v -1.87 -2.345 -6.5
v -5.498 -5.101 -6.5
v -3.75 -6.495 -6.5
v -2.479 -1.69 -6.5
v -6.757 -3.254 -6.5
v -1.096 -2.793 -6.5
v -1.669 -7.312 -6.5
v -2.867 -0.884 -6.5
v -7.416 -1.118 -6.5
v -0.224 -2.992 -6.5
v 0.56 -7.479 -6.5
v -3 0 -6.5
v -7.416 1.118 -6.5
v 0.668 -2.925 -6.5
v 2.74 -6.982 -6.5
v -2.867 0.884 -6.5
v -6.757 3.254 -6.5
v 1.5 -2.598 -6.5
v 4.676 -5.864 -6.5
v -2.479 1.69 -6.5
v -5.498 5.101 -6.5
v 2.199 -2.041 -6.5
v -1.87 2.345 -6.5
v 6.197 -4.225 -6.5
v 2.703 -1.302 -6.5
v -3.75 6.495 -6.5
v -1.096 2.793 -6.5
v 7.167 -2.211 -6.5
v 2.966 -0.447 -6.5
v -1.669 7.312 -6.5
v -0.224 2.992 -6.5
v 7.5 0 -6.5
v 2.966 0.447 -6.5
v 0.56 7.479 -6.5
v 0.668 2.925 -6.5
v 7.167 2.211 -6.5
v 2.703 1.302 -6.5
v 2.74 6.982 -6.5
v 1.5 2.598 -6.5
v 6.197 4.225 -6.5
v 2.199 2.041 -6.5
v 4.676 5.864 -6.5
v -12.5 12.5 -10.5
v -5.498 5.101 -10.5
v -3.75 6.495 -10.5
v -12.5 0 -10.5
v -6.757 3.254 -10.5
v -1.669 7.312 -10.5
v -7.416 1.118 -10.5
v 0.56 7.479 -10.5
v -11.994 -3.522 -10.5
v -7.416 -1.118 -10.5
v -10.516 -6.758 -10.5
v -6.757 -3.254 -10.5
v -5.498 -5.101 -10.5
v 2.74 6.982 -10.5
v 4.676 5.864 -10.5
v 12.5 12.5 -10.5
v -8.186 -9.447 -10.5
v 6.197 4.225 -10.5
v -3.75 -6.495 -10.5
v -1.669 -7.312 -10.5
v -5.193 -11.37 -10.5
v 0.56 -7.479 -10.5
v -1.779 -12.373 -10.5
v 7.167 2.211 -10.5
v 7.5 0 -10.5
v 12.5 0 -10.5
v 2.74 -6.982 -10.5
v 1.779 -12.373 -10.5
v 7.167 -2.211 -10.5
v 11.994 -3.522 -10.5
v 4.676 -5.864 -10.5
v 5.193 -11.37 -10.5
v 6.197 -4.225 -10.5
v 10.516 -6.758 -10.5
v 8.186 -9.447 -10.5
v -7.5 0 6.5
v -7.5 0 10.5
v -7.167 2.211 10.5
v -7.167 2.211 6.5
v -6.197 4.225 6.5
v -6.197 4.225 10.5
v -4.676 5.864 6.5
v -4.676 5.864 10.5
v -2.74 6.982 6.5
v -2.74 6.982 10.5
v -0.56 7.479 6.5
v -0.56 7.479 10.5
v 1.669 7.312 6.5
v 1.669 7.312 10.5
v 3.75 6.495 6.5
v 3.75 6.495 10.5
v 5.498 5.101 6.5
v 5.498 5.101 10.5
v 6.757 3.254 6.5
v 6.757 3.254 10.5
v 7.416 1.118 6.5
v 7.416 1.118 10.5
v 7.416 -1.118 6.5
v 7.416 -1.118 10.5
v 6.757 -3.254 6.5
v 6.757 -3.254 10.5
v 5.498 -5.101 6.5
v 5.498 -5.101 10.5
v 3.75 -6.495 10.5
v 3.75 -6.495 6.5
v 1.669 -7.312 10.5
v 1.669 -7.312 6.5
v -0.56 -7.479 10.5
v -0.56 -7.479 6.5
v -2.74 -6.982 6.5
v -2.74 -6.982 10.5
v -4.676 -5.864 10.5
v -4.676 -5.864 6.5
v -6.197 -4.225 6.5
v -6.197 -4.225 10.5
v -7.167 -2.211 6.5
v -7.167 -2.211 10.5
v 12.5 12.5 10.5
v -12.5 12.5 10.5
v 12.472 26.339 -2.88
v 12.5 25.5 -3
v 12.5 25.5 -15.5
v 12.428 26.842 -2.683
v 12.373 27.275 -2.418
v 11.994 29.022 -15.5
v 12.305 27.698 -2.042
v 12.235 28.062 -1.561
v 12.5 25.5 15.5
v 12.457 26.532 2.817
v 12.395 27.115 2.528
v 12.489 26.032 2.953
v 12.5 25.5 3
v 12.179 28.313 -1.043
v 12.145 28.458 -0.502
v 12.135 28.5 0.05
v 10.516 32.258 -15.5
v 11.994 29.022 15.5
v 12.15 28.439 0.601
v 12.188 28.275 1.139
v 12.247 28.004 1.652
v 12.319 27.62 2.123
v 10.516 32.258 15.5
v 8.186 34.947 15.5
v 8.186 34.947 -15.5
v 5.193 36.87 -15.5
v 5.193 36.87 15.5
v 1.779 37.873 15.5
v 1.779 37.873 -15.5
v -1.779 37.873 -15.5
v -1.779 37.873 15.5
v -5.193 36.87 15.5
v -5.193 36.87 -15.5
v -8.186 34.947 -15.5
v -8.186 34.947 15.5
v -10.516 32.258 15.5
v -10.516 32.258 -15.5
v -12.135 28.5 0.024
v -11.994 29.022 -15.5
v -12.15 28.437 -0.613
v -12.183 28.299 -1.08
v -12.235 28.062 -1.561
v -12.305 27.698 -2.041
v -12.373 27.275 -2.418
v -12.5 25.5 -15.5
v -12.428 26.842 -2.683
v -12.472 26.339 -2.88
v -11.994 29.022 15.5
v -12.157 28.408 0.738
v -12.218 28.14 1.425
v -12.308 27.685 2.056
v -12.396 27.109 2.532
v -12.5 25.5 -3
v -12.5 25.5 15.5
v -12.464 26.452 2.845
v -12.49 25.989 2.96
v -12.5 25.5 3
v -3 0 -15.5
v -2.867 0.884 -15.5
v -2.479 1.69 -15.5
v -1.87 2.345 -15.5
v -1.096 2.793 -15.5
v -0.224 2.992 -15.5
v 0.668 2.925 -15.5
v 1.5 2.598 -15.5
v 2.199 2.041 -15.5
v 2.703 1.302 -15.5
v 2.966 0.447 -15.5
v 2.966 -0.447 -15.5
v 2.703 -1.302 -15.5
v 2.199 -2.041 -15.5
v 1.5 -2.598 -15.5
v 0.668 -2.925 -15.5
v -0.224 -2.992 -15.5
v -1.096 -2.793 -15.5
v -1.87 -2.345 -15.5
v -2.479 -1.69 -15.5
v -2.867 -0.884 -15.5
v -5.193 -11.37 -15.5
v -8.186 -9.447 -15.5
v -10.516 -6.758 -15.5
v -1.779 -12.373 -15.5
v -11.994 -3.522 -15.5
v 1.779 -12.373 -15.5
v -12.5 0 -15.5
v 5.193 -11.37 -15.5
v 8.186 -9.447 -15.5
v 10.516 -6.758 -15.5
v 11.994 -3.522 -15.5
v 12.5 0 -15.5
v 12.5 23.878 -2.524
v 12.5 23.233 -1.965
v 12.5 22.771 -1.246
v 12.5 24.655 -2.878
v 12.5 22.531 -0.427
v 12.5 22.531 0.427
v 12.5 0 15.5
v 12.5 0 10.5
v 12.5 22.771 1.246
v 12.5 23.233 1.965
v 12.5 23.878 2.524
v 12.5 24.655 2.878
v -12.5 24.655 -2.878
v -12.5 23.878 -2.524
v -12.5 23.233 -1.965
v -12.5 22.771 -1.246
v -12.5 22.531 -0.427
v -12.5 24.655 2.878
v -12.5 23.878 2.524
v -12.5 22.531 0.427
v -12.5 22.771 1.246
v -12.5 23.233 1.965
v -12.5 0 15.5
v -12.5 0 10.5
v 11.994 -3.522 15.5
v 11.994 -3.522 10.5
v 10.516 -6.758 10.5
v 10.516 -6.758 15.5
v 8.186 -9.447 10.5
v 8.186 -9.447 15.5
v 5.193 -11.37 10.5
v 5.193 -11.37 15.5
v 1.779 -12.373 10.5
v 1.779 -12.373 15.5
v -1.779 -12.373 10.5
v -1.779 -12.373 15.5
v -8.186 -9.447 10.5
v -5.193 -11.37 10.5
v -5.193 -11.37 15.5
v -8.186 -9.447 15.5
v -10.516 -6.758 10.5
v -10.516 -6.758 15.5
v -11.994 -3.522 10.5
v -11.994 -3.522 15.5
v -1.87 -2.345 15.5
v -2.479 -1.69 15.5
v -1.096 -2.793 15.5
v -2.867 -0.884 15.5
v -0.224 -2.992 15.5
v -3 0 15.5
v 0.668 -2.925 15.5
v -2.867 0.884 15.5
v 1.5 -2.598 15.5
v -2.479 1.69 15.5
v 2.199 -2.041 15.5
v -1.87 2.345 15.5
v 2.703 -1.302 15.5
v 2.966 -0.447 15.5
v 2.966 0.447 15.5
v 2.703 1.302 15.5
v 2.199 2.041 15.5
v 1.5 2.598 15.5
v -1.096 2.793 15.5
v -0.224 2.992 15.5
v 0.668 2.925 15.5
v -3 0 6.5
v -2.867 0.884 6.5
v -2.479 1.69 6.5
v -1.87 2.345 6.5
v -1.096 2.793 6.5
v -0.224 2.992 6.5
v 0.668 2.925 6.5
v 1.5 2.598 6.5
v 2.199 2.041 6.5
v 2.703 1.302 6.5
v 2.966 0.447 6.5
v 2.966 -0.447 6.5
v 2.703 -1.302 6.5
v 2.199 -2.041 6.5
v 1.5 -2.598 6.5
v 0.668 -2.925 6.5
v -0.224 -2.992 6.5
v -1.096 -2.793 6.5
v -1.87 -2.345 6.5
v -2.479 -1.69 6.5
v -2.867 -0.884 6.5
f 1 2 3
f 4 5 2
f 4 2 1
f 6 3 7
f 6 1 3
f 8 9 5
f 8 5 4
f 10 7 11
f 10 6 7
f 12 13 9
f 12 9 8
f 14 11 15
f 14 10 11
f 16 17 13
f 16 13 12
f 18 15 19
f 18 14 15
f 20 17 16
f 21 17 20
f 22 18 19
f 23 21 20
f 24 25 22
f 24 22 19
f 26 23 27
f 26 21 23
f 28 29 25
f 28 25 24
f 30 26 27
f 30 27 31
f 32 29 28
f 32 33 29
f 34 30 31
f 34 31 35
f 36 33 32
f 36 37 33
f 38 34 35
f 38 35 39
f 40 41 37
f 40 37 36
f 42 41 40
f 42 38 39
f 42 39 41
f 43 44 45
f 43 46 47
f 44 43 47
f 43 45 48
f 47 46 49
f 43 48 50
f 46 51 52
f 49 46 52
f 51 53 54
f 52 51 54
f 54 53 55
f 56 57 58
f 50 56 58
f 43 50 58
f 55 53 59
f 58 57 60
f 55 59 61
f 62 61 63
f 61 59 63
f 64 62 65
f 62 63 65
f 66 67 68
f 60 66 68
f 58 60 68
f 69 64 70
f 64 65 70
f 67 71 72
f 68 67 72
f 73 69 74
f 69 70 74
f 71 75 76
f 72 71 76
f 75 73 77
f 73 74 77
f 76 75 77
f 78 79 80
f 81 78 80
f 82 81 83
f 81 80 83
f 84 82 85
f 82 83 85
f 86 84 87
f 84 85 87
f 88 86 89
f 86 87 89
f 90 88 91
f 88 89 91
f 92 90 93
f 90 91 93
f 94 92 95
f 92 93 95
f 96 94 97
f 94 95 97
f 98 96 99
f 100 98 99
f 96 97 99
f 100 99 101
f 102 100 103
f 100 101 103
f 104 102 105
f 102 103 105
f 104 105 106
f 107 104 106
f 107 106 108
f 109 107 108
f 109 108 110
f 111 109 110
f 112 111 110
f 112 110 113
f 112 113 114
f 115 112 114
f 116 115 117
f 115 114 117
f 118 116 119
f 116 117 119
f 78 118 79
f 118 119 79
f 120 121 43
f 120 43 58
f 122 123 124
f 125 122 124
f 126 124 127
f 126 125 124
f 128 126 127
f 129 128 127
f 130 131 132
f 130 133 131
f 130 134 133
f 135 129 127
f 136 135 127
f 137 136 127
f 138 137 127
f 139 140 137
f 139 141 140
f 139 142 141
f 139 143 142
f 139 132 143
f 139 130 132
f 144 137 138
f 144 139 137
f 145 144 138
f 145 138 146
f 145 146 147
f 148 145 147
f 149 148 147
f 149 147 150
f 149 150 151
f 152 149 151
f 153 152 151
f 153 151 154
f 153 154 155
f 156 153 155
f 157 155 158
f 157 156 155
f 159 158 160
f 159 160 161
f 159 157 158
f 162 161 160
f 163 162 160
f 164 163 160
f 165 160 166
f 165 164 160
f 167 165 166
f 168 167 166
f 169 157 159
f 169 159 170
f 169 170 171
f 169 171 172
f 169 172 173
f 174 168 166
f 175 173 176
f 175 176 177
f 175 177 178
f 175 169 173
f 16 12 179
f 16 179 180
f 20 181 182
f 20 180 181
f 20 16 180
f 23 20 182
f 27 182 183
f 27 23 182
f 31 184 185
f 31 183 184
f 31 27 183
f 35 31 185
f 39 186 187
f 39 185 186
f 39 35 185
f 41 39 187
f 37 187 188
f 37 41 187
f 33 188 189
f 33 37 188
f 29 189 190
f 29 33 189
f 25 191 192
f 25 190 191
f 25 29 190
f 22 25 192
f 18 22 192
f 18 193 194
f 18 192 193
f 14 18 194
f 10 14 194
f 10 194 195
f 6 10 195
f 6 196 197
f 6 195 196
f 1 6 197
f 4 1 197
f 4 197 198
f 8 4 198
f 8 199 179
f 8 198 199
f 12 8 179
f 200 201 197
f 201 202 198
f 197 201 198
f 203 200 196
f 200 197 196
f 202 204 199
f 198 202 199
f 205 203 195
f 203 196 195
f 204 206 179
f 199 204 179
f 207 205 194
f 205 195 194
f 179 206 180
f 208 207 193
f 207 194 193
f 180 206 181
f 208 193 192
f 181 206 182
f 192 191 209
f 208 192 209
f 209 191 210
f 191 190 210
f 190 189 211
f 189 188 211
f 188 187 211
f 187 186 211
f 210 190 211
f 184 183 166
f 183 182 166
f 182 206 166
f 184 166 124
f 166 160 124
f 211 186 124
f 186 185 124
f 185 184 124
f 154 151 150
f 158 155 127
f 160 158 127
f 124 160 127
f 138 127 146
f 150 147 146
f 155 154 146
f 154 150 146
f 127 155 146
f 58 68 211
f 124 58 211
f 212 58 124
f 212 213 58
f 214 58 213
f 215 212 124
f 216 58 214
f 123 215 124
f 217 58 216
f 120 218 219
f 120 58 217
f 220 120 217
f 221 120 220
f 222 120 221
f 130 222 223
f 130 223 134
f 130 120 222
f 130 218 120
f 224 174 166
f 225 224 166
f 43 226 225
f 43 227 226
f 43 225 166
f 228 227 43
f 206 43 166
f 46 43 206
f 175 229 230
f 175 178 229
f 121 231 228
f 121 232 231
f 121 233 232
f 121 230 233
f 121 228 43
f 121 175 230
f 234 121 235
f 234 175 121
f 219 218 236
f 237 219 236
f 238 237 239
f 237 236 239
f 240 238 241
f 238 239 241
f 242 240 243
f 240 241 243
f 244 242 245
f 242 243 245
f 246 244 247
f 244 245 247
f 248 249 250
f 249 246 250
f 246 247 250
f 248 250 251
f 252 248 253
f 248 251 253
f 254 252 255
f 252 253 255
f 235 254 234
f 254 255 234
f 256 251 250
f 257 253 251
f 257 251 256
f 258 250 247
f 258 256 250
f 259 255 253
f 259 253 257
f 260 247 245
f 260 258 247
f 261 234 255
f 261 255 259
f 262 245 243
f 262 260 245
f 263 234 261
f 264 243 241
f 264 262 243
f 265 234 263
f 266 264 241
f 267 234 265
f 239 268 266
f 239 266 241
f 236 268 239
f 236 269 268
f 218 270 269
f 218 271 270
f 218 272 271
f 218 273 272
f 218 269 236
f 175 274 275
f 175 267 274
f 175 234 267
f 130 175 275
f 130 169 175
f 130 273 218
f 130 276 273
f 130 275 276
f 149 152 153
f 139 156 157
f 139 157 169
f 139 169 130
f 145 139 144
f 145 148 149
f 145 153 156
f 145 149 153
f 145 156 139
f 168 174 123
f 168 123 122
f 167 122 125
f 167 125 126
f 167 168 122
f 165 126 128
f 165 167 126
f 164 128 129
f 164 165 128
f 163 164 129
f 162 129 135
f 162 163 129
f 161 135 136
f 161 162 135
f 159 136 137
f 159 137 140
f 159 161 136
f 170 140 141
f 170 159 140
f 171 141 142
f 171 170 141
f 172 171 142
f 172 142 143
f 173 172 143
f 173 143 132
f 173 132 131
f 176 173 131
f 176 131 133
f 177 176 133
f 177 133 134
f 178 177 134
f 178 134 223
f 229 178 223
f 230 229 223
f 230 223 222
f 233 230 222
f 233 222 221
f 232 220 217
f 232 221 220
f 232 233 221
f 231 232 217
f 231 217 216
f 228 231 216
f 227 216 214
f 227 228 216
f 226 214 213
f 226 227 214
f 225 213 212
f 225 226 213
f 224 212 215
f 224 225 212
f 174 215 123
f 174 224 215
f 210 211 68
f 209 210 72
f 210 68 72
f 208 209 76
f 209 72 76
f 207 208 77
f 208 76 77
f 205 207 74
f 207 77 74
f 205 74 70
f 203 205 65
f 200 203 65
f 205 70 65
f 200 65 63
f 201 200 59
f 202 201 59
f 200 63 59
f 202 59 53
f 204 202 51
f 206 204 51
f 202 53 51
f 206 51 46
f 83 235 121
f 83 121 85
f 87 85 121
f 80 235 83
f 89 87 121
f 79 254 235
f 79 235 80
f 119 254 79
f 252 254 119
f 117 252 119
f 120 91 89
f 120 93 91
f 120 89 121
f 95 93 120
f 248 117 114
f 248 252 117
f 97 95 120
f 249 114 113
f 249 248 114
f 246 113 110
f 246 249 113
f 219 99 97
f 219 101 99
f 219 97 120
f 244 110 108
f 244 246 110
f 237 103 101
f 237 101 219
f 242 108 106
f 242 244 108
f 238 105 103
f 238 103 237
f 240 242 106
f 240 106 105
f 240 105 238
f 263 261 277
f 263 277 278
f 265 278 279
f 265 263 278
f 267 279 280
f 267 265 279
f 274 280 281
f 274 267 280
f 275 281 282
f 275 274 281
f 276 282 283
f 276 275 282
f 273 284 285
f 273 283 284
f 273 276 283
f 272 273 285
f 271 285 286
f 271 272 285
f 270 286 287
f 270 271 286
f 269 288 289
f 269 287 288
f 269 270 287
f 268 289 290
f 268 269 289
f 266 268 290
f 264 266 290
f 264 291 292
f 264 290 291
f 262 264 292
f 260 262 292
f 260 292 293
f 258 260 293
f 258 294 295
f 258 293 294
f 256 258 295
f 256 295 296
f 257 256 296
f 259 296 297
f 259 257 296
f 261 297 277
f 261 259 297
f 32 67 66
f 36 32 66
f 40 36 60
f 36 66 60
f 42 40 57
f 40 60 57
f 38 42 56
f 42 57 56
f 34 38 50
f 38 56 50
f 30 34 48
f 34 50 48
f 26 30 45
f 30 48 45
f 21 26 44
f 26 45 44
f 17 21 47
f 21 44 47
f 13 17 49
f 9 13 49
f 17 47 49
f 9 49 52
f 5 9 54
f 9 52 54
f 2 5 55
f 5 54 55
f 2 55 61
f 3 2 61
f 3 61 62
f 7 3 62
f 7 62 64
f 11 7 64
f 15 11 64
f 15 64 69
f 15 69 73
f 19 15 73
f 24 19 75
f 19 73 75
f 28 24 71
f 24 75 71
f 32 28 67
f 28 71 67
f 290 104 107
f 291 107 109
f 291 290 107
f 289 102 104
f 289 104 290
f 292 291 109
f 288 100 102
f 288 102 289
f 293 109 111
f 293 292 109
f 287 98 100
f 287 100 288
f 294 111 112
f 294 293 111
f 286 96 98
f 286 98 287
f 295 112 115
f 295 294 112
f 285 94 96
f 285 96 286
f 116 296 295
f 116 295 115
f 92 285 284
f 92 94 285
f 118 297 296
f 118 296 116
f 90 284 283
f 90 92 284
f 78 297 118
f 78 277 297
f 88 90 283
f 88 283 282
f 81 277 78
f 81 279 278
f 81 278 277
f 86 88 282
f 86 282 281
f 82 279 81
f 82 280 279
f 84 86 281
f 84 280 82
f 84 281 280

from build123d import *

# Parameters (mm, degrees)
BOSS_EXTRUDE2_DEPTH     = 15.5
CUT_EXTRUDE1_DEPTH      = 24.510635891
CUT_EXTRUDE1_DEPTH_BACK = 24.510635891
SKETCH5_W               = 25
SKETCH5_H               = 21
SKETCH6_R               = 7.5
BOSS_EXTRUDE3_DEPTH     = 4
SKETCH7_R               = 7.5
BOSS_EXTRUDE4_DEPTH     = 4
CUT_EXTRUDE2_DEPTH      = 36.68613176
CUT_EXTRUDE2_DEPTH_BACK = 36.68613176
SKETCH8_R               = 3
BOSS_EXTRUDE6_DEPTH     = 31
CUT_EXTRUDE3_DEPTH      = 49.054656382
CUT_EXTRUDE3_DEPTH_BACK = 49.054656382
SKETCH11_R              = 3


with BuildPart() as part:
    # Sketch1 → Boss-Extrude2 (new, symmetric)
    with BuildSketch(Plane.XY):
        with BuildLine():
            Line((-12.5, 0), (-12.5, 12.5))
            Line((-12.5, 12.5), (12.5, 12.5))
            Line((12.5, 12.5), (12.5, 0))
            ThreePointArc((12.5, 0), (0, -12.5), (-12.5, 0))
        make_face()
    extrude(amount=BOSS_EXTRUDE2_DEPTH, both=True)

    # Sketch5 → Cut-Extrude1 (cut, two sides: drawn at the far end of the back side and taken through both)
    with BuildSketch(Plane(origin=(0, 0, 0), x_dir=(1, 0, 0), z_dir=(0, 1, 0)).offset(-CUT_EXTRUDE1_DEPTH_BACK)):
        Rectangle(SKETCH5_W, SKETCH5_H)
    extrude(amount=CUT_EXTRUDE1_DEPTH + CUT_EXTRUDE1_DEPTH_BACK, mode=Mode.SUBTRACT)


with BuildPart() as cut_extrude1_piece_1:
    # of the separate pieces the step leaves, piece 1, a body of its own (cut_extrude1_pieces)
    add(part.part.solids().sort_by_distance((-12.5, 0, -15.5))[0])

    # Sketch6 → Boss-Extrude3 (add)
    with BuildSketch(Plane.XY.offset(-10.5)):
        Circle(SKETCH6_R)
    extrude(amount=BOSS_EXTRUDE3_DEPTH)


with BuildPart() as cut_extrude1_piece_2:
    # of the separate pieces the step leaves, piece 2, a body of its own (cut_extrude1_pieces)
    add(part.part.solids().sort_by_distance((-12.5, 0, 10.5))[0])

    # Sketch7 → Boss-Extrude4 (add)
    with BuildSketch(Plane(origin=(0, 0, 10.5), x_dir=(-1, 0, 0), z_dir=(0, 0, -1))):
        Circle(SKETCH7_R)
    extrude(amount=BOSS_EXTRUDE4_DEPTH)


with BuildPart() as cut_extrude2_tool:
    # Sketch8 → Cut-Extrude2 (new, two sides: drawn at the far end of the back side and taken through both)
    with BuildSketch(Plane(origin=(0, 0, -15.5), x_dir=(-1, 0, 0), z_dir=(0, 0, -1)).offset(-CUT_EXTRUDE2_DEPTH_BACK)):
        Circle(SKETCH8_R)
    extrude(amount=CUT_EXTRUDE2_DEPTH + CUT_EXTRUDE2_DEPTH_BACK)


with BuildPart() as cut_extrude1_piece_1_1:
    add(cut_extrude1_piece_1.part)

    # Cut-Extrude2: cut by cut_extrude2_tool
    add(cut_extrude2_tool.part, mode=Mode.SUBTRACT)


with BuildPart() as cut_extrude1_piece_2_1:
    add(cut_extrude1_piece_2.part)

    # Cut-Extrude2: cut by cut_extrude2_tool
    add(cut_extrude2_tool.part, mode=Mode.SUBTRACT)

    # Sketch9 → Boss-Extrude6 (add)
    with BuildSketch(Plane.XY.offset(15.5)):
        with BuildLine():
            Line((12.5, 12.5), (12.5, 25.5))
            ThreePointArc((12.5, 25.5), (0, 38), (-12.5, 25.5))
            Line((-12.5, 25.5), (-12.5, 12.5))
            Line((-12.5, 12.5), (12.5, 12.5))
        make_face()
    extrude(amount=-BOSS_EXTRUDE6_DEPTH)

    # Sketch11 → Cut-Extrude3 (cut, two sides: drawn at the far end of the back side and taken through both)
    with BuildSketch(Plane(origin=(12.5, 0, 0), x_dir=(0, 0, -1), z_dir=(1, 0, 0)).offset(-CUT_EXTRUDE3_DEPTH_BACK)):
        with Locations((0, 25.5)):
            Circle(SKETCH11_R)
    extrude(amount=CUT_EXTRUDE3_DEPTH + CUT_EXTRUDE3_DEPTH_BACK, mode=Mode.SUBTRACT)


with BuildPart() as cut_extrude1_piece_1_2:
    add(cut_extrude1_piece_1_1.part)

    # Combine1: union Cut-Extrude1 piece 2
    add(cut_extrude1_piece_2_1.part)


solid = cut_extrude1_piece_1_2.part
